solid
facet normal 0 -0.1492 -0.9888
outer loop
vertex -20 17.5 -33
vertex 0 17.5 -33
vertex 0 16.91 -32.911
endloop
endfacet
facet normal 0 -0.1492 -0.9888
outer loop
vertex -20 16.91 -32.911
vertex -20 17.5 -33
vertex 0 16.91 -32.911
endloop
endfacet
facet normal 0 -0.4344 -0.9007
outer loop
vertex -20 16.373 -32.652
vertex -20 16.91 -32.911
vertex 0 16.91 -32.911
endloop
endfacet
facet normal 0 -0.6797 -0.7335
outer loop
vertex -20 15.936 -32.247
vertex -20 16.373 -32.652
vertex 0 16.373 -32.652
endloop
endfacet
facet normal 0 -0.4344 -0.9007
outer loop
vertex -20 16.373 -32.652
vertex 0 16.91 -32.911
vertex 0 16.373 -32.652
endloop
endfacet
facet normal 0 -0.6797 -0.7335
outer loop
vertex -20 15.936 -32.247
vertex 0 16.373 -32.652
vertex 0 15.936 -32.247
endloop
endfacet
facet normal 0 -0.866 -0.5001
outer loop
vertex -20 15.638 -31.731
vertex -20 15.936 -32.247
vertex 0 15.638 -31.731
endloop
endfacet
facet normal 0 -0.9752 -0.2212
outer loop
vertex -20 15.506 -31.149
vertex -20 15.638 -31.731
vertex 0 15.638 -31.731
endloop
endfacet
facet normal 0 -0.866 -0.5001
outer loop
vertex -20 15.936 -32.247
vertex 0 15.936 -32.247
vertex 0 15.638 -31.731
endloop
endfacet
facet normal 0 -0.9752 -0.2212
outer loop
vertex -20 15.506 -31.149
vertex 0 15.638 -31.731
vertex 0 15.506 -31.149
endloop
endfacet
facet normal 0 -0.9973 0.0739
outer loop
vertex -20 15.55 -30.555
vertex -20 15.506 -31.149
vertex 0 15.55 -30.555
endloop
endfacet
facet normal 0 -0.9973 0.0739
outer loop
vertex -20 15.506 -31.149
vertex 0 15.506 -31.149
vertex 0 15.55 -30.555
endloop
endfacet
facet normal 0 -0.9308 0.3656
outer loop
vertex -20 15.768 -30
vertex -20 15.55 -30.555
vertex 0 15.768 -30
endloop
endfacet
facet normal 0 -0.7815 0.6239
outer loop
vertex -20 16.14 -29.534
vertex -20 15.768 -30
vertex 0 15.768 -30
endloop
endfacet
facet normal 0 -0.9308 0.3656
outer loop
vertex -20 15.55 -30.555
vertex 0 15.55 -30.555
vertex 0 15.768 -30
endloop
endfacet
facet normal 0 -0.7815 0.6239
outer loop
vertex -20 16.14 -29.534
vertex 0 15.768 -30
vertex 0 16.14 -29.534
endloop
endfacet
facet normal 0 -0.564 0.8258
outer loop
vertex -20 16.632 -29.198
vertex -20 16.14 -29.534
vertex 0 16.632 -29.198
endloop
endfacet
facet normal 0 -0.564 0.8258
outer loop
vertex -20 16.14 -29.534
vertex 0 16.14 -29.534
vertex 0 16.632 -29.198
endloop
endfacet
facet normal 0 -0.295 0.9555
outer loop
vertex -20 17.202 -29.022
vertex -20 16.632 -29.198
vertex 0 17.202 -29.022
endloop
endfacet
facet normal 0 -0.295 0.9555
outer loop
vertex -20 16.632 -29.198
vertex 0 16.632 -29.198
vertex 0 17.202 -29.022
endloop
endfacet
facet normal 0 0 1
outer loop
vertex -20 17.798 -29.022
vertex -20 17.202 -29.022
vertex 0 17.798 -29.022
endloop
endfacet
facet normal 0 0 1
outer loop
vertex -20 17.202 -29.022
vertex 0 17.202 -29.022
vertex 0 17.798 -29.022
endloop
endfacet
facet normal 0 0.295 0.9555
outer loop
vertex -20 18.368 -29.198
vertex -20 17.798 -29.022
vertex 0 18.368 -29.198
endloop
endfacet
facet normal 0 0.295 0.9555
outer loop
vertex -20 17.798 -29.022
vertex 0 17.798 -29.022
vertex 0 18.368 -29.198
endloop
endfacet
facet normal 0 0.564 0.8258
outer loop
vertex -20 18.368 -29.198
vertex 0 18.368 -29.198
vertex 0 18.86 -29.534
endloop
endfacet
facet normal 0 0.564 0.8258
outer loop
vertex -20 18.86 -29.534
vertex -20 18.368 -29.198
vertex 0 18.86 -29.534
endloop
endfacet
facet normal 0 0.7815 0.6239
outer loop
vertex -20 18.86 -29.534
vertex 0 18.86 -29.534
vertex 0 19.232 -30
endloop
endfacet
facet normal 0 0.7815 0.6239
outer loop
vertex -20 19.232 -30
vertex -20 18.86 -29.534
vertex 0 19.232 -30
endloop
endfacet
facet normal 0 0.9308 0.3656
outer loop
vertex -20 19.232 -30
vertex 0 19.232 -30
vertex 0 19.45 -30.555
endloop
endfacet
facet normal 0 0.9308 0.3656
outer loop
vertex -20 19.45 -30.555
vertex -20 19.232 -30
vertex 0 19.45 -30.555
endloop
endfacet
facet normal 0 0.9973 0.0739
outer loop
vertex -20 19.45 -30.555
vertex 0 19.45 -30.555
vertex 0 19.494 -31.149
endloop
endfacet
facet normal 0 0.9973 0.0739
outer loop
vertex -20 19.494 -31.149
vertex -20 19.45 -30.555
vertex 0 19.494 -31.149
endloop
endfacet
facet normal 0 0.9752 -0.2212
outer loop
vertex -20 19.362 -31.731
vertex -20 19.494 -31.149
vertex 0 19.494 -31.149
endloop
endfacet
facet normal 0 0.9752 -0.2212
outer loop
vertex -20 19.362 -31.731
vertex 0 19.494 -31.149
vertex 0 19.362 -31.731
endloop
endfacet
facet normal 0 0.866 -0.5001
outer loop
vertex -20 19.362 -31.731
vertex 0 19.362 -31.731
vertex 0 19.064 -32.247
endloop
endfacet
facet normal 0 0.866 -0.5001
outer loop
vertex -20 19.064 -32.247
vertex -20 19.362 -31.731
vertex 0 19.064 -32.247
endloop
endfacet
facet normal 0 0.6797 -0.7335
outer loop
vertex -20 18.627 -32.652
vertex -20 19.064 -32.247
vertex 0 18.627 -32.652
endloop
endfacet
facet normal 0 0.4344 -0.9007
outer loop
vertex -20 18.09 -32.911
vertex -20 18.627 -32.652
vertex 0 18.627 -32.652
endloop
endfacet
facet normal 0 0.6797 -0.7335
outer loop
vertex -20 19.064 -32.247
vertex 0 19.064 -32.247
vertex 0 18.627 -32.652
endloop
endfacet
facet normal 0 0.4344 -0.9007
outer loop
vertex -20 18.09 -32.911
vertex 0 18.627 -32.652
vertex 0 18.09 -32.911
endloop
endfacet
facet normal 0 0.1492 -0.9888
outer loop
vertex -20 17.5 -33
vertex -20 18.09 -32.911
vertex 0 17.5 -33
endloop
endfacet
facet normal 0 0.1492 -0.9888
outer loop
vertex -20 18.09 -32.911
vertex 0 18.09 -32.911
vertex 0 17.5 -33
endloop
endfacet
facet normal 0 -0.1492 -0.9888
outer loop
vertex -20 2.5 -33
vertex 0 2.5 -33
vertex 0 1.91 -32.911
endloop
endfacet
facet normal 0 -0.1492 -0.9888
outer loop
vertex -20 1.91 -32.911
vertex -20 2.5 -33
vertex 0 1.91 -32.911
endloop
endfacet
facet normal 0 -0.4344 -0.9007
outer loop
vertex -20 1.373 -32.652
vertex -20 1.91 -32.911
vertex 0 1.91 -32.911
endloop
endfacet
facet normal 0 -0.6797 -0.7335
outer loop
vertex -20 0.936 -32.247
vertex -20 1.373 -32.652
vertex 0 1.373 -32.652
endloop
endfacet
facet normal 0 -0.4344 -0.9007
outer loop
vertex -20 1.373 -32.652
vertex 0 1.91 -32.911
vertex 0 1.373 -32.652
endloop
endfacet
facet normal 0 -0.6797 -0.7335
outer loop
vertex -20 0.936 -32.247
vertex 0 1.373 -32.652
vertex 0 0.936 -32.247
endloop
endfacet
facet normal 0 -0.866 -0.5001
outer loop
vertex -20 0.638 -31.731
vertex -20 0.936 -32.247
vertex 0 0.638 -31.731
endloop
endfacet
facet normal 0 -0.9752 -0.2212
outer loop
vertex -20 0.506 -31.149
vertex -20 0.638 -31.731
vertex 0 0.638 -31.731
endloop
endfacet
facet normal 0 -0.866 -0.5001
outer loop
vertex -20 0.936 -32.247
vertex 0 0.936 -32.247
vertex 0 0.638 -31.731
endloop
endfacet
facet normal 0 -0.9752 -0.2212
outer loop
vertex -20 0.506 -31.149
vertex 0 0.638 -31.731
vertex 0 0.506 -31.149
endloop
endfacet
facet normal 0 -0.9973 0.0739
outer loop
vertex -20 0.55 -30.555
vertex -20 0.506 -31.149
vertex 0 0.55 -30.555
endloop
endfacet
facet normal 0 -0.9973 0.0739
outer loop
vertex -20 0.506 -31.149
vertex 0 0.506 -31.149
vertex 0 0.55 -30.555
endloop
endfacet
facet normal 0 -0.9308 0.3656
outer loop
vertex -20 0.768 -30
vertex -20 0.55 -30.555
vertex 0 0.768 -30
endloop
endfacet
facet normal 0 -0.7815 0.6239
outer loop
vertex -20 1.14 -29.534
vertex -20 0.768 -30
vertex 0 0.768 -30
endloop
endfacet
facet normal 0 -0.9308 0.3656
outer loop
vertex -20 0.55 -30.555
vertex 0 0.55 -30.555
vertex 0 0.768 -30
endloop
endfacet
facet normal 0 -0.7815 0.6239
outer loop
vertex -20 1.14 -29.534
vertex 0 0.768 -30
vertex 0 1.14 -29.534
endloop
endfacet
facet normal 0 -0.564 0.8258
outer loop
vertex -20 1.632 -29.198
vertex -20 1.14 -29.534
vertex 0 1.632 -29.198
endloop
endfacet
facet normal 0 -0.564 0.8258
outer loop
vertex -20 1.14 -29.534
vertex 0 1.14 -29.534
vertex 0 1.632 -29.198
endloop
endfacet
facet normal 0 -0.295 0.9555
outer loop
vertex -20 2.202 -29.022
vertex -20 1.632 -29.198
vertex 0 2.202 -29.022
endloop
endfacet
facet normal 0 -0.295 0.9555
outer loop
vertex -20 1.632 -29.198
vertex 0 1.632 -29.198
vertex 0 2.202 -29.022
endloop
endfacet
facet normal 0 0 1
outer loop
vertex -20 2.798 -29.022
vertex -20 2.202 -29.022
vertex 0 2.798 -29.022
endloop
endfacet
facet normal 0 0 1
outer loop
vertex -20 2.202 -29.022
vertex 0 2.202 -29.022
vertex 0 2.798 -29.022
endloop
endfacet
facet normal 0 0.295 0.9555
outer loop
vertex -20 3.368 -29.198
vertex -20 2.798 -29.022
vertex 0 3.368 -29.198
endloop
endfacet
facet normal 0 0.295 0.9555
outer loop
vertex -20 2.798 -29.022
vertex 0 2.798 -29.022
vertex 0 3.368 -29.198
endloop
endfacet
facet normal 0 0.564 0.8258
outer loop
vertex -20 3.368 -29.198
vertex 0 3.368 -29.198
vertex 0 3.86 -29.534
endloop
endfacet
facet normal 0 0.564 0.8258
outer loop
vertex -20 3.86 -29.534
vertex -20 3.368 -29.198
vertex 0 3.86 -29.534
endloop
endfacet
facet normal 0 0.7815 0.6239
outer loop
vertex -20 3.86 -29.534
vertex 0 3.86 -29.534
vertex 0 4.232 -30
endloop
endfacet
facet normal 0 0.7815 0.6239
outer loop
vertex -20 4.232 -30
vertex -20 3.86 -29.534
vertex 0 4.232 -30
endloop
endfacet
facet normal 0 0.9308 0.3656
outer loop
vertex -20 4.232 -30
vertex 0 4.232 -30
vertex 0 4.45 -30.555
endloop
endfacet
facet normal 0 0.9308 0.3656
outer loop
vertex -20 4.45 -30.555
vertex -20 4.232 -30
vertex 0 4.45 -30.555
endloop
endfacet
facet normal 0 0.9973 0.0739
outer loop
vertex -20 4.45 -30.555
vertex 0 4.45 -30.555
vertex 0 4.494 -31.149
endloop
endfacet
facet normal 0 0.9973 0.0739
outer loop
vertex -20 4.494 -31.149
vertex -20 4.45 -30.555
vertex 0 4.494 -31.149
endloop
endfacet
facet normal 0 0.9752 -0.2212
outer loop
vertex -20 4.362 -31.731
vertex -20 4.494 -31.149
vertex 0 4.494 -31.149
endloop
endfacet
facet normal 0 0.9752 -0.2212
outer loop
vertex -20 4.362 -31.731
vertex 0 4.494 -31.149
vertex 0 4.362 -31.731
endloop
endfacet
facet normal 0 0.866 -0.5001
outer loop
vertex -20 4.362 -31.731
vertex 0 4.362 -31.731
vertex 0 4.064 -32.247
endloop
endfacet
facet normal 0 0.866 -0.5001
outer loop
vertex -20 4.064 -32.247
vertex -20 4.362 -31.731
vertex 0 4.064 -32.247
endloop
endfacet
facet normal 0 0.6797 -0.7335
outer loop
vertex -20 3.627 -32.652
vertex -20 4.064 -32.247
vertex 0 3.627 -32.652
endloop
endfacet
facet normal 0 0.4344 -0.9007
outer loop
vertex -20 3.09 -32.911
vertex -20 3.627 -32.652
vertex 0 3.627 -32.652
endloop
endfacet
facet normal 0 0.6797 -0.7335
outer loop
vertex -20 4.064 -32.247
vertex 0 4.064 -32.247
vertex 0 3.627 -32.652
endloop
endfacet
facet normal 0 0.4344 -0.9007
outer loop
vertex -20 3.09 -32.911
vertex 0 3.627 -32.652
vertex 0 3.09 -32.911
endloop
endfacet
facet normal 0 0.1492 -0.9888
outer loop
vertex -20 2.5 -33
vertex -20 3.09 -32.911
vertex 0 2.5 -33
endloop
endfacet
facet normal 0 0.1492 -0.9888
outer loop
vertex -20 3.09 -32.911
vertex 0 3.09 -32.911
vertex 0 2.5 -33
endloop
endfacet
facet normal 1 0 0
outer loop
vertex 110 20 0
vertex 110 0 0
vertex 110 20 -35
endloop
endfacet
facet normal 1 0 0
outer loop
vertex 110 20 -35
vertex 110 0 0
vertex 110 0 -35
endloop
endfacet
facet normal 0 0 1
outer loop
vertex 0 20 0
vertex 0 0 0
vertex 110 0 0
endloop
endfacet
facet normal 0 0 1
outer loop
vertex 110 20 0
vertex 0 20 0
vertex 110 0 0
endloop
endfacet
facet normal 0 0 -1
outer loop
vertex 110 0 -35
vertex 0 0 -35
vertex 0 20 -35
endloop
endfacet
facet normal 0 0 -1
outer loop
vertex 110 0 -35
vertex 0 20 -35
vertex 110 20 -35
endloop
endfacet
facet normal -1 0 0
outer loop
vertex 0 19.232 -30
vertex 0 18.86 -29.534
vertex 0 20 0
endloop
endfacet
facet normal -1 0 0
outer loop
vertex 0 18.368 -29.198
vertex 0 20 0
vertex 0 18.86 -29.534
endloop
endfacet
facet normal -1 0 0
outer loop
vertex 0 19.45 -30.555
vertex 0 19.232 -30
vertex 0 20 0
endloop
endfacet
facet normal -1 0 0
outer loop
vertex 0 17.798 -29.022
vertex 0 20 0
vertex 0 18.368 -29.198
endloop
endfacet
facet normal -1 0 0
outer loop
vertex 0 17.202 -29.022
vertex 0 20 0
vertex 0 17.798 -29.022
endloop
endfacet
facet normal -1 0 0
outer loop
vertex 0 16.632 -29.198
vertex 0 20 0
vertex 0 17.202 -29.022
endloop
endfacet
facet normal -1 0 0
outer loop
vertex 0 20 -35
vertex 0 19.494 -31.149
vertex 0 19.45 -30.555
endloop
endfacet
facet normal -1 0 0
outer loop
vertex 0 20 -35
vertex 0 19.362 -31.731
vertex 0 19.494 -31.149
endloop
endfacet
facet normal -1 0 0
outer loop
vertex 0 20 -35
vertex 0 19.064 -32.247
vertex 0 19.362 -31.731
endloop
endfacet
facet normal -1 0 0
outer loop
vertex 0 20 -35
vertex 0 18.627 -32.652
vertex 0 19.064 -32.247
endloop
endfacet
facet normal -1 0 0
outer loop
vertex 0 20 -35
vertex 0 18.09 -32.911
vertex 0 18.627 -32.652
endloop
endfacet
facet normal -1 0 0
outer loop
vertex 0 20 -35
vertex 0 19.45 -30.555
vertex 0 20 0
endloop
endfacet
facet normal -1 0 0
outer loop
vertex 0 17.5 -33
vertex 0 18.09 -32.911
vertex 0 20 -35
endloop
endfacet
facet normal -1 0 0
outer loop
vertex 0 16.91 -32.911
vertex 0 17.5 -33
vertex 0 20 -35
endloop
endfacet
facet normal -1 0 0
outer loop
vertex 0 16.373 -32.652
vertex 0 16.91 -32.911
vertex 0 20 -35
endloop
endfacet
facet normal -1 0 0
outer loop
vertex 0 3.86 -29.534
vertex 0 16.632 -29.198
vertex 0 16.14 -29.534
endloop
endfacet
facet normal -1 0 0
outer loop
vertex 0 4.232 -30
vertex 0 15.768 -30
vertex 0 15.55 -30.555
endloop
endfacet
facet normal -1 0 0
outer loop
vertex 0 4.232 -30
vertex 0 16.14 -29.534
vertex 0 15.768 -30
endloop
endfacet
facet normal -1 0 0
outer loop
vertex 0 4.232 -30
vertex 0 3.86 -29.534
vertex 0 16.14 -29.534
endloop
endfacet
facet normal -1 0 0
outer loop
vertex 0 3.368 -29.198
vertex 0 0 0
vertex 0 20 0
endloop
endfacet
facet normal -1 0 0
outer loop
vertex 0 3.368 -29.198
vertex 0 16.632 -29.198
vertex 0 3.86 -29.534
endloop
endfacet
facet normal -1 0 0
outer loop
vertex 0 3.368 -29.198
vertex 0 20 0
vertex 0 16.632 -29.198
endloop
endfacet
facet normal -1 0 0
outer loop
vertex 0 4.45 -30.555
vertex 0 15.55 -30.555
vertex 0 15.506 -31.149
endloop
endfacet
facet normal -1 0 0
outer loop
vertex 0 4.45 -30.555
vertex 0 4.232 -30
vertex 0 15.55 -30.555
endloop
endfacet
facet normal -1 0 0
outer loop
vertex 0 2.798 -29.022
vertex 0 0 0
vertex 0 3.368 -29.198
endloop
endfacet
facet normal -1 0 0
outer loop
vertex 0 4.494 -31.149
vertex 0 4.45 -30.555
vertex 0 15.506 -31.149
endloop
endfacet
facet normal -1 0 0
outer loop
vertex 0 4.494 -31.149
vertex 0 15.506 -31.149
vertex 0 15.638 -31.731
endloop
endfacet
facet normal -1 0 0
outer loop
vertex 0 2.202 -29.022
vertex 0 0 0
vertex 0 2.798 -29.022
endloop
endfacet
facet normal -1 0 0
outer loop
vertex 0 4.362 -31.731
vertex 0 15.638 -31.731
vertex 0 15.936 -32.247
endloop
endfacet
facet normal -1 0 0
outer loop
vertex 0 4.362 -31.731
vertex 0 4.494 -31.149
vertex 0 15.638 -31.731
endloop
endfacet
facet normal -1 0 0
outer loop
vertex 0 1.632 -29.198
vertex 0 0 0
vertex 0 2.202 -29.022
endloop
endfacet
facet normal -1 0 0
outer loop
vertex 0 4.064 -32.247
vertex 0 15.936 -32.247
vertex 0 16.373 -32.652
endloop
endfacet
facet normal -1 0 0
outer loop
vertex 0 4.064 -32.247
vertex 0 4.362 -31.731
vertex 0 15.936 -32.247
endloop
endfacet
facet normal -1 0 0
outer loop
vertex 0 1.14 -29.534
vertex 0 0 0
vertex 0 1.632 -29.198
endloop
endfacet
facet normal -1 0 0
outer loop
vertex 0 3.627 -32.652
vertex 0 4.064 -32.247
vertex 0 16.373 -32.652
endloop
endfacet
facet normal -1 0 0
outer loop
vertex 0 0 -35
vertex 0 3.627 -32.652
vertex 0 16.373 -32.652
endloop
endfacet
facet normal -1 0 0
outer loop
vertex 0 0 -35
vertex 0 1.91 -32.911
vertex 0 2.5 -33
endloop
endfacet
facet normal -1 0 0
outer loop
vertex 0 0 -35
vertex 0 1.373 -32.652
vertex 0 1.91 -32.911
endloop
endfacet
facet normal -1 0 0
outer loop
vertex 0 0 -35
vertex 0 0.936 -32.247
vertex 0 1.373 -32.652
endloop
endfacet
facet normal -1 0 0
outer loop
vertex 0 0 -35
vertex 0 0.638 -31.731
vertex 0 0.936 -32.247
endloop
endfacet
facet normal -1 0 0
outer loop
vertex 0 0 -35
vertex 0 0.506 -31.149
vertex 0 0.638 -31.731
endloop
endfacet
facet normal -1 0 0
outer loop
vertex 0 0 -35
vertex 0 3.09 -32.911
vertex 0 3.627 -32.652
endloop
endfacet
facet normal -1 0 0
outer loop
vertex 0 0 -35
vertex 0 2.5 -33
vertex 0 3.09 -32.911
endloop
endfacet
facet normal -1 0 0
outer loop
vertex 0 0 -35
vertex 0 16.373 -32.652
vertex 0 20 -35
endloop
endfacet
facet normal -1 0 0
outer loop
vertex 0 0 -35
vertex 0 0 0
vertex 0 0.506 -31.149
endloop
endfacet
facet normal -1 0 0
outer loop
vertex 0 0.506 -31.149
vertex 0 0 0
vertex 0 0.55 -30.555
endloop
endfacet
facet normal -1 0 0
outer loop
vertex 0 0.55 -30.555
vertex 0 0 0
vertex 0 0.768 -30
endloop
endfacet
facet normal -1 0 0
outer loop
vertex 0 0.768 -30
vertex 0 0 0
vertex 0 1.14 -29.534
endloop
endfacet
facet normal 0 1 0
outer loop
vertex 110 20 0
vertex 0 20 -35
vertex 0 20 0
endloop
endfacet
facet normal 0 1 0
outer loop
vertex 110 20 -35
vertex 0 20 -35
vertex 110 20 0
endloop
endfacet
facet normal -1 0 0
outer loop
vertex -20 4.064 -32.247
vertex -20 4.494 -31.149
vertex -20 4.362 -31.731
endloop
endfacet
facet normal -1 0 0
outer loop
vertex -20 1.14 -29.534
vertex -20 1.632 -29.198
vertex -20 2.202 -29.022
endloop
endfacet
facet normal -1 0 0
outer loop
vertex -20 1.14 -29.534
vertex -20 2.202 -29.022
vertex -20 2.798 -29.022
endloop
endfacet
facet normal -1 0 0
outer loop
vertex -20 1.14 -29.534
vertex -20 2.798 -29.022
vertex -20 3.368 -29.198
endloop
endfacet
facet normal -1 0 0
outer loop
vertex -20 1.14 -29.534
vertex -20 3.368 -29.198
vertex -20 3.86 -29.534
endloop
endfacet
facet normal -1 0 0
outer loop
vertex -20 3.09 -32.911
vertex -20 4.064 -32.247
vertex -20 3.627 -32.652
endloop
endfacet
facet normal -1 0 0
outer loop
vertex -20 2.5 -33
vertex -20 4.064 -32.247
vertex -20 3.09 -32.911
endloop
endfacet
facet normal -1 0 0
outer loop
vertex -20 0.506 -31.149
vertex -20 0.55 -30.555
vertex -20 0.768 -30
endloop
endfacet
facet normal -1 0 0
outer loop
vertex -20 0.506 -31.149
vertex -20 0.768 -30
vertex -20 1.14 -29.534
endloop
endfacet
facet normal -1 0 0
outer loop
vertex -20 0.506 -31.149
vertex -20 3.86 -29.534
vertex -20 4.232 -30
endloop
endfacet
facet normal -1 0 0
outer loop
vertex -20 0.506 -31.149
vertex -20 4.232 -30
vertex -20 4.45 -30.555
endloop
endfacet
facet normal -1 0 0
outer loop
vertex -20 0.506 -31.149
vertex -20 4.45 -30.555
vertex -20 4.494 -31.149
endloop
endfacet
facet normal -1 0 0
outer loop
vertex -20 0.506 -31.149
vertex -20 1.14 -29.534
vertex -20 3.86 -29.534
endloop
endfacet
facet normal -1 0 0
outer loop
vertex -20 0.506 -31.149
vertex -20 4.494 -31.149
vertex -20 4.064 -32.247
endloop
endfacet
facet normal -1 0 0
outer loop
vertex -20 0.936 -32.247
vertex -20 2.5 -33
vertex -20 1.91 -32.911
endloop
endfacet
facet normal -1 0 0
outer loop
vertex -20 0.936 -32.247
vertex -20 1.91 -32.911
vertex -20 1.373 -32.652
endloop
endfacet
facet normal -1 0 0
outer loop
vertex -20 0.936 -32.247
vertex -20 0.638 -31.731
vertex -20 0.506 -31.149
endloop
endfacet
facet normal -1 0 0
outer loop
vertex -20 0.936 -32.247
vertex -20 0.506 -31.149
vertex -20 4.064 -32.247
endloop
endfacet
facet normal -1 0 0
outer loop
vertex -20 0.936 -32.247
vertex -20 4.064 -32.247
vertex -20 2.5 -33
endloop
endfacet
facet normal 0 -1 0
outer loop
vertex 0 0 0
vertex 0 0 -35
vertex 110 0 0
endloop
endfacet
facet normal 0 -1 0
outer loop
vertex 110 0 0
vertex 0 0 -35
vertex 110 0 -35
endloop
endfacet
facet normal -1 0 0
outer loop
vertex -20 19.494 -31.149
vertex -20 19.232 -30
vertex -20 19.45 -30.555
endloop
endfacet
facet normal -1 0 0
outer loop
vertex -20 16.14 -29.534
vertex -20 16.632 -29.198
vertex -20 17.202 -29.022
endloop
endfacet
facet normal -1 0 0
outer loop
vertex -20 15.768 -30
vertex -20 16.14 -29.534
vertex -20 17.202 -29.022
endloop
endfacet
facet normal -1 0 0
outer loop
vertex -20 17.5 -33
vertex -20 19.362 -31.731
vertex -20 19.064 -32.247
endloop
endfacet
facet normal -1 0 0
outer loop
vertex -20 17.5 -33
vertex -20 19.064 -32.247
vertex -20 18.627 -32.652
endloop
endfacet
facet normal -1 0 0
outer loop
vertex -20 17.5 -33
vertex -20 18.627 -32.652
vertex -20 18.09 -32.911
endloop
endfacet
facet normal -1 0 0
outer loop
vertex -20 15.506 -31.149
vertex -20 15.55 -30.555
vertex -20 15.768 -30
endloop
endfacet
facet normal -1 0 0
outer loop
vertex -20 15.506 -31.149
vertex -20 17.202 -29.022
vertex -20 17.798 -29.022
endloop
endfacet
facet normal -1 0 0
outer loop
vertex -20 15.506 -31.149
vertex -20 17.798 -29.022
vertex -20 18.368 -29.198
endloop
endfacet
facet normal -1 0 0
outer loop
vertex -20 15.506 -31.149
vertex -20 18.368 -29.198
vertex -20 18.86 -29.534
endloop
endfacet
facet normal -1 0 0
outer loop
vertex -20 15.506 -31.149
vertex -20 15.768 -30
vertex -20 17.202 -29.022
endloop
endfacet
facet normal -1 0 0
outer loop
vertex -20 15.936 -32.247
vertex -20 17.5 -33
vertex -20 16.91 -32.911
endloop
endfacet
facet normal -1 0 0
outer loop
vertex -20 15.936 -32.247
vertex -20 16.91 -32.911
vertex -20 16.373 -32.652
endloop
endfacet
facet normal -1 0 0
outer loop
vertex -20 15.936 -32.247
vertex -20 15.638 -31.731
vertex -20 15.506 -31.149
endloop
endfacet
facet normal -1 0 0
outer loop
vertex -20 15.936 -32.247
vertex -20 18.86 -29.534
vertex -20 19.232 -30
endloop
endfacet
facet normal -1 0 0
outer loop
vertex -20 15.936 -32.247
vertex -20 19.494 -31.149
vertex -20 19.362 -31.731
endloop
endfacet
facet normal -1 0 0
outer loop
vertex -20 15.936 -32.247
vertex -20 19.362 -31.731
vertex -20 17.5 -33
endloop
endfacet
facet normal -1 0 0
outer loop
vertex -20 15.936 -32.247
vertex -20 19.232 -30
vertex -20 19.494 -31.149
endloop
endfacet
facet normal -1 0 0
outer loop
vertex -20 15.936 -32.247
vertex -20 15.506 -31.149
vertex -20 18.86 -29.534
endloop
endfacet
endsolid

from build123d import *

# Parameters (mm, degrees)
SKETCH1_W           = 110
SKETCH1_H           = 35
BOSS_EXTRUDE1_DEPTH = 20
SKETCH2_R           = 2
BOSS_EXTRUDE2_DEPTH = 20


with BuildPart() as part:
    # Sketch1 → Boss-Extrude1 (new body)
    with BuildSketch(Plane(origin=(0, 0, 0), x_dir=(1, 0, 0), z_dir=(0, 1, 0))):
        with Locations((55, 17.5)):
            Rectangle(SKETCH1_W, SKETCH1_H)
    extrude(amount=BOSS_EXTRUDE1_DEPTH)

    # Sketch2 → Boss-Extrude2 (add)
    with BuildSketch(Plane.ZY):
        with Locations(Location((-31, 17.5, 0), (0, 0, 180))):
            Circle(SKETCH2_R)
        with Locations(Location((-31, 2.5, 0), (0, 0, 180))):
            Circle(SKETCH2_R)
    extrude(amount=BOSS_EXTRUDE2_DEPTH)


solid = part.part
